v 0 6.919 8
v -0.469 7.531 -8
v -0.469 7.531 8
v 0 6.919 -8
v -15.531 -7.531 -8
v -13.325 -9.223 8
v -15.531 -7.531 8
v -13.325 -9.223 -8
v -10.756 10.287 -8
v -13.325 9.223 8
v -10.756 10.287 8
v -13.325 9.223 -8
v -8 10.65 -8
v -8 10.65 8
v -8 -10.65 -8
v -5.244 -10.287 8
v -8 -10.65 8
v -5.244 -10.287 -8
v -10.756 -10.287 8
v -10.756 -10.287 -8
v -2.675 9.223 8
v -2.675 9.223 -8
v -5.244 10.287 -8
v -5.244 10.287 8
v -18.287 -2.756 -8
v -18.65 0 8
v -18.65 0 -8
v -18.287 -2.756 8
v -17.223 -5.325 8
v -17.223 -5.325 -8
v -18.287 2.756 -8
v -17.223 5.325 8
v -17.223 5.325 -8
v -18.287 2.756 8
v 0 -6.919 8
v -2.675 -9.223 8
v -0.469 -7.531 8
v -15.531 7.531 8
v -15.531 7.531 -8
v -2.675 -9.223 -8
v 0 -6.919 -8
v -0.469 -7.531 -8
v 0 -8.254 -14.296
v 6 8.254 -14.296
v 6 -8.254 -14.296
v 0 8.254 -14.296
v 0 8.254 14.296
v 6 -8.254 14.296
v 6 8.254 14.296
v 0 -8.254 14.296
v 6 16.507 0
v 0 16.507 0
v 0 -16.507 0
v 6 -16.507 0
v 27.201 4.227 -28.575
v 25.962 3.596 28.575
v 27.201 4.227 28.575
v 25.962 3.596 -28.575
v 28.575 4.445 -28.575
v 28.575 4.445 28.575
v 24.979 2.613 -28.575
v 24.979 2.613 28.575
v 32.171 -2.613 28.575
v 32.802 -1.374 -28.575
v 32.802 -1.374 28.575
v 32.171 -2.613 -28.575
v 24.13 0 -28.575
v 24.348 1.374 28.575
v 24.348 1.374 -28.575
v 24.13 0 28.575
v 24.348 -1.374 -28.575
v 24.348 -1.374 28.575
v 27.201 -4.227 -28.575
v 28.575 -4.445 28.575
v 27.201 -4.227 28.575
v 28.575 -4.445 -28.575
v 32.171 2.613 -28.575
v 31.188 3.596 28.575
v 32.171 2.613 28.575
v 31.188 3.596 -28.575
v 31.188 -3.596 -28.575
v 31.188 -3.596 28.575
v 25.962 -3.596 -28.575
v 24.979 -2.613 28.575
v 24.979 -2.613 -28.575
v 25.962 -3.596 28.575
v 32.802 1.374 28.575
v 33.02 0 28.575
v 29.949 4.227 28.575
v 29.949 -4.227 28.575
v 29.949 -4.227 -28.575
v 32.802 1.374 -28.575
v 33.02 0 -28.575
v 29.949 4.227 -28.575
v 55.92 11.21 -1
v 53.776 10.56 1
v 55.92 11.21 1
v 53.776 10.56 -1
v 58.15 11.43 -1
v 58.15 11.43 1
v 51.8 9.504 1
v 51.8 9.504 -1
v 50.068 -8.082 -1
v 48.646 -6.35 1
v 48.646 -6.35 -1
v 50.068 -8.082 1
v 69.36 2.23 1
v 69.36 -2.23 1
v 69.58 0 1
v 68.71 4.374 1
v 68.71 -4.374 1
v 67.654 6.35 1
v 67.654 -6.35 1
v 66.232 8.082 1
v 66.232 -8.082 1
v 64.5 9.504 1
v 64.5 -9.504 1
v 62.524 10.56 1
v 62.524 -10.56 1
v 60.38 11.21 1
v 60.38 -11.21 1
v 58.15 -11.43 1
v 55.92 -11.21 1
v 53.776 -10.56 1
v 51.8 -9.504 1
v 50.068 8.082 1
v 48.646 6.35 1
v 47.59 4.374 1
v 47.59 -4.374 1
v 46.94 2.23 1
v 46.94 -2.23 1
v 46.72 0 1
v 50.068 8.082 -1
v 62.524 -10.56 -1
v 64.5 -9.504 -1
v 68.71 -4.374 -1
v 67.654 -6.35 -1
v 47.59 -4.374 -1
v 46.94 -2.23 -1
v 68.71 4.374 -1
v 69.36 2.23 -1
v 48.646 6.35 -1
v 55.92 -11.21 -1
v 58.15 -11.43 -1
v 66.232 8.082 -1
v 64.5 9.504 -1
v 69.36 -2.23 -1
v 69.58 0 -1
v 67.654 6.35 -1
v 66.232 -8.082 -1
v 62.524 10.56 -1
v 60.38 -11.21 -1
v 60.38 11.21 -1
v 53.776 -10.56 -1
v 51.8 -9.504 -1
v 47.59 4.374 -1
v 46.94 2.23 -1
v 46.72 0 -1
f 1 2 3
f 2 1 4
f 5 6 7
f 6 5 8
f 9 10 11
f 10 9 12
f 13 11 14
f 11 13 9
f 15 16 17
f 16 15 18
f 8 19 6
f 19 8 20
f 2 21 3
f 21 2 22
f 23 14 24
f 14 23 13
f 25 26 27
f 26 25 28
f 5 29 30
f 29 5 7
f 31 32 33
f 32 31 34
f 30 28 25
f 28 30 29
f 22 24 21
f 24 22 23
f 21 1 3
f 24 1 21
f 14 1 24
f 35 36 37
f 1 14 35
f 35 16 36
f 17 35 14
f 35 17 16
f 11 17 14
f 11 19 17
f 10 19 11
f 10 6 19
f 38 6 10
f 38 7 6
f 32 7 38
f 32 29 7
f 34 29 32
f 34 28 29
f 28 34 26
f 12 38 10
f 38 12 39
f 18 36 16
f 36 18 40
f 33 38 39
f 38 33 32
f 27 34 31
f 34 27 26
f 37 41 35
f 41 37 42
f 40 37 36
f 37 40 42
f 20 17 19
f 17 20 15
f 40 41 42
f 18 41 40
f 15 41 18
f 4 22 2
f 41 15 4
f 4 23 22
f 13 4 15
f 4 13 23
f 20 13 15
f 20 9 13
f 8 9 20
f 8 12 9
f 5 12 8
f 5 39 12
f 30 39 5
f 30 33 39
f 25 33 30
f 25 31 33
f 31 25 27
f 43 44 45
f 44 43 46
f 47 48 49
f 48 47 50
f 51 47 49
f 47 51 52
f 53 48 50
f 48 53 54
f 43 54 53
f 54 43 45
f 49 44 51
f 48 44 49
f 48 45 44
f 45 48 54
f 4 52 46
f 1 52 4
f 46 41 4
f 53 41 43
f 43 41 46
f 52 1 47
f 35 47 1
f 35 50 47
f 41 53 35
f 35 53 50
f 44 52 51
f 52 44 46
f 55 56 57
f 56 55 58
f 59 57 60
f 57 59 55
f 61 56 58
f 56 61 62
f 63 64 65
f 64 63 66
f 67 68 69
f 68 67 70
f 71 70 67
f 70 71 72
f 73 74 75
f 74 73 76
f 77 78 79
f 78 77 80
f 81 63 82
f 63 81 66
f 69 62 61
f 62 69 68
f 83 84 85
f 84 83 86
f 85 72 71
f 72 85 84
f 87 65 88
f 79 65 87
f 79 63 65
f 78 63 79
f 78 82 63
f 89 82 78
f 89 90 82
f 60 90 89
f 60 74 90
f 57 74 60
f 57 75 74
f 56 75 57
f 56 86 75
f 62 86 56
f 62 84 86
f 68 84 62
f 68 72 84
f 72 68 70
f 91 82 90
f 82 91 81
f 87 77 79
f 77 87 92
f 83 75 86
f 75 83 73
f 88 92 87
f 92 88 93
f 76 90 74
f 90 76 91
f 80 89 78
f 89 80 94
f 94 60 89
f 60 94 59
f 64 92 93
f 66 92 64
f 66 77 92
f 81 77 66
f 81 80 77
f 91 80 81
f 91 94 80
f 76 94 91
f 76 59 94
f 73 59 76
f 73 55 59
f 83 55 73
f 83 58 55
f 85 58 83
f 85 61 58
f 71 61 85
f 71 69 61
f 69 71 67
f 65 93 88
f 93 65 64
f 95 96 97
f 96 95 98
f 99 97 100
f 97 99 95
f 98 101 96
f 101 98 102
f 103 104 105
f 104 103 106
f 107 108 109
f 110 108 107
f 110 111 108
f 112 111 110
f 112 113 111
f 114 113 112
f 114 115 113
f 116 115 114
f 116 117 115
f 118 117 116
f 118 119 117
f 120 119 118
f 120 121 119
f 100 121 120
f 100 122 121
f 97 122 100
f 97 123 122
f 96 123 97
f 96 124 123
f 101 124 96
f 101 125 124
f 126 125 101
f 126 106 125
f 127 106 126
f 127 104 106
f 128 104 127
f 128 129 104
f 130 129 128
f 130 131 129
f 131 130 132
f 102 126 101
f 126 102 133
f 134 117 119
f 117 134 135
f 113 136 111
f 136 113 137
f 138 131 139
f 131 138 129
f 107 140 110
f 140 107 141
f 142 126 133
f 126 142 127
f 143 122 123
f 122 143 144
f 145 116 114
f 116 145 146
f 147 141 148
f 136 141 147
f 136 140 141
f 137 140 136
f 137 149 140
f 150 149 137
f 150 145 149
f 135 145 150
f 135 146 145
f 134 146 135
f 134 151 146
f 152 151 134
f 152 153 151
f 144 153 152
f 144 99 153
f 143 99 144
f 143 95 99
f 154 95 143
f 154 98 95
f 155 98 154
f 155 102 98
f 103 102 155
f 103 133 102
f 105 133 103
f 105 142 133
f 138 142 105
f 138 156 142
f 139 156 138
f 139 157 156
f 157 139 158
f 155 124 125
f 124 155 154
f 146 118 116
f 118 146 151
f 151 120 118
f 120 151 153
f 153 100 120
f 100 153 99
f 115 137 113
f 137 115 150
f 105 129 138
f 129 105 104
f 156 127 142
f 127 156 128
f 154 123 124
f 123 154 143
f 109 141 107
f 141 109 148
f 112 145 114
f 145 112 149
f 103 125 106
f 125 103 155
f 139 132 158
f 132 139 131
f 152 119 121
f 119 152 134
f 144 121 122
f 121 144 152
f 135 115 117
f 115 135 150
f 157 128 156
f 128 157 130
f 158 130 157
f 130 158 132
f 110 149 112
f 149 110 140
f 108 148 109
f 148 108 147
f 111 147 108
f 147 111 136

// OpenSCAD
// Auto-generated by scripts/author_from_manifest.py (Phase D.3).
// Source: data/phase_d_manifest.json (sku_intent='tyco-ty3331-sidewall-175f').
// Do not hand-edit — regenerate from the manifest.
//
// @part tyco_ty3331_sidewall_175f
// @kind sprinkler_head
// @category head.sidewall.k56
// @display-name "Tyco TY3331 Horizontal Sidewall K5.6 175°F"
// @mfg tyco_fire_protection
// @mfg-pn TY3331
// @listing UL FM
// @hazard-classes LH OH1
// @price-usd 15.80
// @install-minutes 8
// @crew journeyman
// @k-factor 5.6
// @orientation sidewall
// @response standard
// @temperature 175F
// @param size_in number default=0.5 label="Size" unit="in"
// @port inlet position=[0,0.014,0] direction=[0,1,0] style=NPT_threaded size_in=0.5 role=drop

size_in = 0.5;
k_factor = 5.6;

length_mm   = 57.15;
body_dia_mm = 25.40;
thread_od   = 21.3;
thread_len  = 16;
deflector_d = body_dia_mm * 0.9;

rotate([0,0,90]) union() {
    translate([0, thread_len/2, 0])
        cylinder(h = thread_len, d = thread_od, center = true, $fn = 24);
    translate([0, -3, 0])
        rotate([90, 0, 0])
        cylinder(h = 6, d = thread_od * 1.55, $fn = 6, center = true);
    translate([0, -length_mm/2, 0])
        cylinder(h = length_mm, d = body_dia_mm * 0.35, center = true, $fn = 20);
    translate([0, -length_mm - 1, 0])
        cylinder(h = 2, d = deflector_d, center = true, $fn = 32);
}
